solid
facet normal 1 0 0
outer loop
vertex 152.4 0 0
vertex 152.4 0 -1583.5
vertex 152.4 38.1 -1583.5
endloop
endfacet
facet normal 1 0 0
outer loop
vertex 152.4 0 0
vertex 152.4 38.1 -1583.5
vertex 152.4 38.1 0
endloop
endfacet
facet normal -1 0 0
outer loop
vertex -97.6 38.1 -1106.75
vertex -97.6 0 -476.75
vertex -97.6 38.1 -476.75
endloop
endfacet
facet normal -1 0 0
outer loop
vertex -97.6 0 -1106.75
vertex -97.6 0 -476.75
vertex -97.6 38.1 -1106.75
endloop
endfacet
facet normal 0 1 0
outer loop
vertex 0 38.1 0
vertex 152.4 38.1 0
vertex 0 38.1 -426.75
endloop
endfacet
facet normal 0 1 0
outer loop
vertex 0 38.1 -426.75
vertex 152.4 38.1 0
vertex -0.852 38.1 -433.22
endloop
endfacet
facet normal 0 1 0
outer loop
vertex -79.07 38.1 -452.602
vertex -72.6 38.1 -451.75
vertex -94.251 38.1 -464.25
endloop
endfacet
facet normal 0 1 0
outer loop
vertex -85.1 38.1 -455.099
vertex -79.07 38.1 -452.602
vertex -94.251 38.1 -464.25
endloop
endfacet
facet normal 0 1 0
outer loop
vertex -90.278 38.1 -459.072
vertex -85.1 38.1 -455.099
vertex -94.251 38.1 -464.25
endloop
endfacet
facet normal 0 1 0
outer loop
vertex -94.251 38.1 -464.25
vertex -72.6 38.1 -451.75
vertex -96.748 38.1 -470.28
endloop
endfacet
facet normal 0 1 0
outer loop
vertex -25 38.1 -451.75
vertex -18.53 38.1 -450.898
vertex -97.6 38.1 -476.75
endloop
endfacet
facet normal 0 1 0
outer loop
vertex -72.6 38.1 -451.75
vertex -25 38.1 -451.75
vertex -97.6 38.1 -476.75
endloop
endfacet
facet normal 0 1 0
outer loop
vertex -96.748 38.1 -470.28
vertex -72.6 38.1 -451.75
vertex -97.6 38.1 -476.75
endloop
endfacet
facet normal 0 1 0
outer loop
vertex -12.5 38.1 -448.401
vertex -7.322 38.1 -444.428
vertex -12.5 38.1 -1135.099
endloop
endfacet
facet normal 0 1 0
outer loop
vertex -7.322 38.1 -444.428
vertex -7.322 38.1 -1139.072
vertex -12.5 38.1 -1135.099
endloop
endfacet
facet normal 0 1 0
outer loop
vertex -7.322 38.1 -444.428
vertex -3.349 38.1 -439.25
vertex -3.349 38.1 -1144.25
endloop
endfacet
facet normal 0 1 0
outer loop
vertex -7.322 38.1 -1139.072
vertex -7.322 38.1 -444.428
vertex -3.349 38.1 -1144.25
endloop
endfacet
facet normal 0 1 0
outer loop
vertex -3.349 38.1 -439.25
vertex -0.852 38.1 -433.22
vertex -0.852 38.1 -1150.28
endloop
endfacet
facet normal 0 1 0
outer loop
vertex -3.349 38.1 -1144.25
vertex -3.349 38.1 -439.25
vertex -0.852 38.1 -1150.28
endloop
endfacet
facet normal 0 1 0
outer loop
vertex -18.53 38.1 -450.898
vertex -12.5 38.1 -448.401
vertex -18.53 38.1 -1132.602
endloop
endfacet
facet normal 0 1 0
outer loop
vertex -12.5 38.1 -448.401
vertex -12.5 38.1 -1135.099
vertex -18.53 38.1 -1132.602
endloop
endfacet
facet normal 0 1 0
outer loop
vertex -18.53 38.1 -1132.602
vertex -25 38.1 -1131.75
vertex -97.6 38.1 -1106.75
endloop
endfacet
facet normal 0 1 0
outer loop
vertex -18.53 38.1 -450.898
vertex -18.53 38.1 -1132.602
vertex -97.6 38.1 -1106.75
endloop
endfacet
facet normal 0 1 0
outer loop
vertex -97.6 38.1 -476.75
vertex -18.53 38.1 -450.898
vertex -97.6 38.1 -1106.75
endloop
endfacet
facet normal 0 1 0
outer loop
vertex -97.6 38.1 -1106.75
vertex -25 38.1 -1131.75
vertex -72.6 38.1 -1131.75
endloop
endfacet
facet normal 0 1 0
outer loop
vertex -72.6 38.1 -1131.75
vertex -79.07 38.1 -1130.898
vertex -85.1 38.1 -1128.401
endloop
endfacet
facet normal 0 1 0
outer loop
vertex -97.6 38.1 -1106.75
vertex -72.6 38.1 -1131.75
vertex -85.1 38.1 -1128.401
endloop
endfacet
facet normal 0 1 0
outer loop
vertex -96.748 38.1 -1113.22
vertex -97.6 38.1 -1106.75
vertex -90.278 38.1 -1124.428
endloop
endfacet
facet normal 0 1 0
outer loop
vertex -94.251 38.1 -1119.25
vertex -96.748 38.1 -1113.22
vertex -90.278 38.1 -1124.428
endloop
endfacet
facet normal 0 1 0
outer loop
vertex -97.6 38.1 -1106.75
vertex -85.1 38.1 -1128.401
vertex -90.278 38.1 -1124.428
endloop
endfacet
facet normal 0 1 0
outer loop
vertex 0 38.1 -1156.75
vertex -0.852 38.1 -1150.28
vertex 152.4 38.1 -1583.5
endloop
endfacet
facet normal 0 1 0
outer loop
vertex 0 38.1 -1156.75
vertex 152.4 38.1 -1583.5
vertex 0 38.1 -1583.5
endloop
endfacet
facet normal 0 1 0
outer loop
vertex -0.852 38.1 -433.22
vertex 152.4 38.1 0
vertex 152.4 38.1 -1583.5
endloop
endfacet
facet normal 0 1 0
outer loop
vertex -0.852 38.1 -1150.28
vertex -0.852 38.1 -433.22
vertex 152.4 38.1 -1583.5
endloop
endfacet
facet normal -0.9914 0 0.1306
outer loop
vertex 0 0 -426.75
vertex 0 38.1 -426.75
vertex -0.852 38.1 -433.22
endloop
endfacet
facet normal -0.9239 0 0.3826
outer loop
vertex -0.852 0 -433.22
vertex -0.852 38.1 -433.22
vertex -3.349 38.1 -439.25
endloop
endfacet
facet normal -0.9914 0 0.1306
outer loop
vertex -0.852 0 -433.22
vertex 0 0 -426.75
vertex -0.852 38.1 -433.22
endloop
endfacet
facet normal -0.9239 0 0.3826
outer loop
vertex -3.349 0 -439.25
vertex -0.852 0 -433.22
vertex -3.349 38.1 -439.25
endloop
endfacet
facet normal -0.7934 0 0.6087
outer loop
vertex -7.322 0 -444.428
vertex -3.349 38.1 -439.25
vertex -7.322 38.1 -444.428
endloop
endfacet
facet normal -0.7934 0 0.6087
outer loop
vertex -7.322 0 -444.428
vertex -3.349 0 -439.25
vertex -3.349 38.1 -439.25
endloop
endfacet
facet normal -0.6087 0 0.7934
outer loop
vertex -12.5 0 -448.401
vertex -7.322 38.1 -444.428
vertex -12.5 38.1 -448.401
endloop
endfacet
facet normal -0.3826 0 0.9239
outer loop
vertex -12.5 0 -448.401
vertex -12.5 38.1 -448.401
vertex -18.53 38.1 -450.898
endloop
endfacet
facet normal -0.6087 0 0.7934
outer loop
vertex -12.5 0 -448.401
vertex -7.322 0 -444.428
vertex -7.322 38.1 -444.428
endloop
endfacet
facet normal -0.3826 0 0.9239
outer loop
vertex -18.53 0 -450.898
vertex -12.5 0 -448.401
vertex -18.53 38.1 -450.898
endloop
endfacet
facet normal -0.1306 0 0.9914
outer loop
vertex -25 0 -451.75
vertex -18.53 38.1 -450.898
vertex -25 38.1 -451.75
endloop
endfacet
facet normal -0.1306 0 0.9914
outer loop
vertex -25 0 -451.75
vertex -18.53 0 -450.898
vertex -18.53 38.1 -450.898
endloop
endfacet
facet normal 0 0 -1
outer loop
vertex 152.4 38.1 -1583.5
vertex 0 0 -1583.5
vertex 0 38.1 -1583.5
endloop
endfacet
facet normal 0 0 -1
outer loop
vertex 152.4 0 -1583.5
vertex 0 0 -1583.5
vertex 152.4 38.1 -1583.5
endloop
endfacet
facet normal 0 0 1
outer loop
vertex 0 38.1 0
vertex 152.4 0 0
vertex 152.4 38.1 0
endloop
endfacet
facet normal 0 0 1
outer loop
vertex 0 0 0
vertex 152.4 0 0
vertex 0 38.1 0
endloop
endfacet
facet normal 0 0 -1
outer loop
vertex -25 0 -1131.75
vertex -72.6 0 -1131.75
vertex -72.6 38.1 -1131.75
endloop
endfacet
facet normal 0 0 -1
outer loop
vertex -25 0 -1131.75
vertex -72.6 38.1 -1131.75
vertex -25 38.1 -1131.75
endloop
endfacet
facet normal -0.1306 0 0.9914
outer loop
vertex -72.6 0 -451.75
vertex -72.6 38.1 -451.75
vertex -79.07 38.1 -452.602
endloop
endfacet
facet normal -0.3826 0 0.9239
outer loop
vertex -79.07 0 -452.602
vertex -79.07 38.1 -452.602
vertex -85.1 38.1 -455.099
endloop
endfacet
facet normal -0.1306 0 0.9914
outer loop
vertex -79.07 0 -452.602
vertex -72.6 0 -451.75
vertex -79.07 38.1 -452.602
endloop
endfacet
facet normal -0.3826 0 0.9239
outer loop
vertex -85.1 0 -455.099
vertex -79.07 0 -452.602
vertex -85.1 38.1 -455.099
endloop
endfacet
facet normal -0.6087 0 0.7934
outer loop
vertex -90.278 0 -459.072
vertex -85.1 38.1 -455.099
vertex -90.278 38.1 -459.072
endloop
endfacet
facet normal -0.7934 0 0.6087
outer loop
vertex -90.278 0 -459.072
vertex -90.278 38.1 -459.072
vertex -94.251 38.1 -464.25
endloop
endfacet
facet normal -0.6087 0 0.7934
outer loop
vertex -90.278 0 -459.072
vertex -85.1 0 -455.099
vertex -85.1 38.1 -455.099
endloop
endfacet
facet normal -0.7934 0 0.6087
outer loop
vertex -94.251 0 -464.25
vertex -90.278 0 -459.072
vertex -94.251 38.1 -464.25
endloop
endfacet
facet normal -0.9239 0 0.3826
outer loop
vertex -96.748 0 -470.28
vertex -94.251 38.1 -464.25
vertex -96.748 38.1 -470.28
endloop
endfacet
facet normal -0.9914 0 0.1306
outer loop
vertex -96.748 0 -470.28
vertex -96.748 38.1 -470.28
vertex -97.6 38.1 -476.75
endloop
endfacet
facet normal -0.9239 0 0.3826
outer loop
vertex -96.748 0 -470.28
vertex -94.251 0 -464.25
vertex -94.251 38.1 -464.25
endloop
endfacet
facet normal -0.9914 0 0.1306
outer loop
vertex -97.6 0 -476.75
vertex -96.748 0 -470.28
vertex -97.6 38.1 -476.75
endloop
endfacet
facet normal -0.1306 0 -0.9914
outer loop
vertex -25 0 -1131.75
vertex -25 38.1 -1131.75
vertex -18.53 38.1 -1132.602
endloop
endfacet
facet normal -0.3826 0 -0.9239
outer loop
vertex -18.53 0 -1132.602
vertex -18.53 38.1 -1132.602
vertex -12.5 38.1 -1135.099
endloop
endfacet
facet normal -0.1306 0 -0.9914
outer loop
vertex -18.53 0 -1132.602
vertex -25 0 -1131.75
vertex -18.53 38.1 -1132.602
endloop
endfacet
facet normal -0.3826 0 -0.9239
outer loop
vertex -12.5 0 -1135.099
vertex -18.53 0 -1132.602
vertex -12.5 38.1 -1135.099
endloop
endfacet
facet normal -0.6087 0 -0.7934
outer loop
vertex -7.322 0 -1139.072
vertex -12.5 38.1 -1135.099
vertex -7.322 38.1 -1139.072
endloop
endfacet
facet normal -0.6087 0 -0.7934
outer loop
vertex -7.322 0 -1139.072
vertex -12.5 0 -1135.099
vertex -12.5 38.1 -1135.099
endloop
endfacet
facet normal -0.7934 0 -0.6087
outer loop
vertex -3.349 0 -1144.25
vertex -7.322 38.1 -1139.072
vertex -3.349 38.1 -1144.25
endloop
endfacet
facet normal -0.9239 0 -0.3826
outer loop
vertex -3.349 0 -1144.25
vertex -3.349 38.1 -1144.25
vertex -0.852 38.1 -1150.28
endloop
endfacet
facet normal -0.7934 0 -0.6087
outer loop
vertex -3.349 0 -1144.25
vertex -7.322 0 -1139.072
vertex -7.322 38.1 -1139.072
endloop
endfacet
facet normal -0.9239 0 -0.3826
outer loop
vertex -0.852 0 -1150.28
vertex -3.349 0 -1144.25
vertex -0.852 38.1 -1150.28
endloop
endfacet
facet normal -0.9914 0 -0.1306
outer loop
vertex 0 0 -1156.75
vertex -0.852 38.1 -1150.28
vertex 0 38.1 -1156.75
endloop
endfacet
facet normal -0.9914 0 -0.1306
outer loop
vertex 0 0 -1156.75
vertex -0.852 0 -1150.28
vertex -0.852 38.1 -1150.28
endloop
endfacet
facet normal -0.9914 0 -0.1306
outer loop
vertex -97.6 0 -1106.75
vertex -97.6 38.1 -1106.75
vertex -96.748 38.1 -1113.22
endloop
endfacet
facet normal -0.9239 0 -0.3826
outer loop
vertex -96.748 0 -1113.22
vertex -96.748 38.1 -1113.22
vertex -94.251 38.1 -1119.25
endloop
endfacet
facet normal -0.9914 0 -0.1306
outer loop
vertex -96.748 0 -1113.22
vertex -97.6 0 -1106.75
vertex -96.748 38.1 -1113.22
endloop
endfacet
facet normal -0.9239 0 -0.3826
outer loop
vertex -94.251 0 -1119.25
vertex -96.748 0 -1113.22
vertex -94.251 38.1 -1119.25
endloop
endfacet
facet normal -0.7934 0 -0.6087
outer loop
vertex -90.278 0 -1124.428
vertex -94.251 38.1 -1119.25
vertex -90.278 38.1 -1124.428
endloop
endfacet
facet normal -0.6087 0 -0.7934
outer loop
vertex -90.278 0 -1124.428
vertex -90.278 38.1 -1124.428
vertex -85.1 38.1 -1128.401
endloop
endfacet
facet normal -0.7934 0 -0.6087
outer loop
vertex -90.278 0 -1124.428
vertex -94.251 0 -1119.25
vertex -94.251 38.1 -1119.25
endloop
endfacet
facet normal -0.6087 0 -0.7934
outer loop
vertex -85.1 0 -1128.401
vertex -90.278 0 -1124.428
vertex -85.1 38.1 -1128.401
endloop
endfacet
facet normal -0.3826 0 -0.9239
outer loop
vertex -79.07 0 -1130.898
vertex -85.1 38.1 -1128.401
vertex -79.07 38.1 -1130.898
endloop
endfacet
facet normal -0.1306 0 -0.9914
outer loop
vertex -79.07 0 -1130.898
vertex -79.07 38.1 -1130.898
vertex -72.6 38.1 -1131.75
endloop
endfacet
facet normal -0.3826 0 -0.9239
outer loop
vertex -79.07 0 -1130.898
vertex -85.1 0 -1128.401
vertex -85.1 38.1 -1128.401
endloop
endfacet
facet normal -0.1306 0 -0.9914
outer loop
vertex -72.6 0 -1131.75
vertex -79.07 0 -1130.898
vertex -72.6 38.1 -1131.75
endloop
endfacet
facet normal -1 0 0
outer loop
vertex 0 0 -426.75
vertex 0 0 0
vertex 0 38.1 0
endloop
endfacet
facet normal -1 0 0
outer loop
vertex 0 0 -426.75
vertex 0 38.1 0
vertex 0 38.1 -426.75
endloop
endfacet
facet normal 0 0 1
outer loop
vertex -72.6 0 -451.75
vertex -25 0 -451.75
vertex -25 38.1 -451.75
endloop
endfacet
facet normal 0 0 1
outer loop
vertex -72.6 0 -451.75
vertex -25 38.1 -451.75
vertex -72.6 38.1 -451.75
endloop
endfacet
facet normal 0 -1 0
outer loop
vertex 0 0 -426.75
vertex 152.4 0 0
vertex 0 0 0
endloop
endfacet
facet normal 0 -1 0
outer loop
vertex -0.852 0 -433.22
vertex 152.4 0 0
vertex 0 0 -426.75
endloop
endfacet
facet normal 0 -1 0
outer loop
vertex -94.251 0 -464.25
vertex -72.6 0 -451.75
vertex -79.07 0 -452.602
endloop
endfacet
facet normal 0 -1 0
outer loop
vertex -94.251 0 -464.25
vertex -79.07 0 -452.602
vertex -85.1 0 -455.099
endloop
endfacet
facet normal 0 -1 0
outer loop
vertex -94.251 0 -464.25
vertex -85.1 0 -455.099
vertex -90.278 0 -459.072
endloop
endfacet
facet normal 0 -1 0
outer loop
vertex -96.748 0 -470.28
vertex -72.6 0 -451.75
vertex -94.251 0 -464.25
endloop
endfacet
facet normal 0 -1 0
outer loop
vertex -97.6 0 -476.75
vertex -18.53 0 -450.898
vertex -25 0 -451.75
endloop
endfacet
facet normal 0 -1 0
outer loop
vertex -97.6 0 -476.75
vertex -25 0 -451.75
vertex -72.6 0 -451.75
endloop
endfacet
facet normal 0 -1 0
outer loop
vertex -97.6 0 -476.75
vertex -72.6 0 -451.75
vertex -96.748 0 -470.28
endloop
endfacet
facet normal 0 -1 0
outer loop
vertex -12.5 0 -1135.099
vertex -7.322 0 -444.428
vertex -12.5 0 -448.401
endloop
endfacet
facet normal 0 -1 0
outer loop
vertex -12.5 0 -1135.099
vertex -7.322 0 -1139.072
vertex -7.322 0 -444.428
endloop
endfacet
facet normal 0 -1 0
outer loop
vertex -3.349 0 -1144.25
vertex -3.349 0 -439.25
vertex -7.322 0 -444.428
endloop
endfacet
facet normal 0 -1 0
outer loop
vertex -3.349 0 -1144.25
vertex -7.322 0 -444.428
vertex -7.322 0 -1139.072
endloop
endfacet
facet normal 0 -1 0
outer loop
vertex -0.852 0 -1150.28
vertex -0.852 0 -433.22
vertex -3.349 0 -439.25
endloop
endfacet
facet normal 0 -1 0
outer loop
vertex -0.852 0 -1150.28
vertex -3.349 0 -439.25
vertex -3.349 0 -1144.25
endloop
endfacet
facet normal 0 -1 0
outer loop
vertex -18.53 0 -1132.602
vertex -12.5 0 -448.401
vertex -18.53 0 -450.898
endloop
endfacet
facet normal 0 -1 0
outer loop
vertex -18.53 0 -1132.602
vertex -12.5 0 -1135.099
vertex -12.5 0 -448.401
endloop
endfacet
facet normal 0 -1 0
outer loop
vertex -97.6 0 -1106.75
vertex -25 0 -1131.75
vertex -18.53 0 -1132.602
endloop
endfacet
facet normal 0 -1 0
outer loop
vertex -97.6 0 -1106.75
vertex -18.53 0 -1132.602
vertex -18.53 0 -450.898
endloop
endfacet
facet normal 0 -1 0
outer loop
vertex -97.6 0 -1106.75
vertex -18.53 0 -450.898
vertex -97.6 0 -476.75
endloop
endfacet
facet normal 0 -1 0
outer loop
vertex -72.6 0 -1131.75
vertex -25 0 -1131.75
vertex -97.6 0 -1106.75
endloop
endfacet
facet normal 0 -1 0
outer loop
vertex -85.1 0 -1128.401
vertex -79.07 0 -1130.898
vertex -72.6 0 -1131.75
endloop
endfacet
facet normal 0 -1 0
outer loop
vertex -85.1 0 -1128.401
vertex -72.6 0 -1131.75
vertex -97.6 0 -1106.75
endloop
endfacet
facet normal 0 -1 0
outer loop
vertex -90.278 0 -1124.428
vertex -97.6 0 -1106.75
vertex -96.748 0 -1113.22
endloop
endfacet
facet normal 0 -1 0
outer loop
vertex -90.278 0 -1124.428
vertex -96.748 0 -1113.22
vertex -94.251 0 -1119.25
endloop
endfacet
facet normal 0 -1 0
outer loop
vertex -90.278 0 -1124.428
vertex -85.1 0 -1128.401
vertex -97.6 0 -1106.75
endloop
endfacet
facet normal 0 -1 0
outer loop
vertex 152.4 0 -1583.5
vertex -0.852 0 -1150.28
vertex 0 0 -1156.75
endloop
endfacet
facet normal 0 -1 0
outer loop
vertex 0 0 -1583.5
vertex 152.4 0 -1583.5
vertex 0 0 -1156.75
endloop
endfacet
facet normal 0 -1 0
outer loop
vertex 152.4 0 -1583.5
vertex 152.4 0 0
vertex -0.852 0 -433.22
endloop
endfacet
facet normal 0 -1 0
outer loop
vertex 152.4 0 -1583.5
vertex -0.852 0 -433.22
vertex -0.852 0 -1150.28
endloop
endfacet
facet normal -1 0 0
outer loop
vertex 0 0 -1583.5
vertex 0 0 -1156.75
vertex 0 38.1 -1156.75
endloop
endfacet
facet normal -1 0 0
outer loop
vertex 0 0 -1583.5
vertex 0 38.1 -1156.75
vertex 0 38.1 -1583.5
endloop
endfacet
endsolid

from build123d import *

# Parameters (mm, degrees)
BOSS_EXTRUDE1_DEPTH = 38.1


with BuildPart() as part:
    # Sketch1 → Boss-Extrude1 (new body)
    with BuildSketch(Plane(origin=(0, 0, 0), x_dir=(1, 0, 0), z_dir=(0, 1, 0))):
        with BuildLine():
            Line((0, 1156.75), (0, 1583.5))
            Line((0, 1583.5), (152.4, 1583.5))
            Line((152.4, 1583.5), (152.4, 0))
            Line((152.4, 0), (0, 0))
            Line((0, 0), (0, 426.75))
            ThreePointArc((0, 426.75), (-7.32233047, 444.42766953), (-25, 451.75))
            Line((-25, 451.75), (-72.6, 451.75))
            ThreePointArc((-72.6, 451.75), (-90.27766953, 459.07233047), (-97.6, 476.75))
            Line((-97.6, 476.75), (-97.6, 1106.75))
            ThreePointArc((-97.6, 1106.75), (-90.27766953, 1124.42766953), (-72.6, 1131.75))
            Line((-72.6, 1131.75), (-25, 1131.75))
            ThreePointArc((-25, 1131.75), (-7.32233047, 1139.07233047), (0, 1156.75))
        make_face()
    extrude(amount=BOSS_EXTRUDE1_DEPTH)


solid = part.part
